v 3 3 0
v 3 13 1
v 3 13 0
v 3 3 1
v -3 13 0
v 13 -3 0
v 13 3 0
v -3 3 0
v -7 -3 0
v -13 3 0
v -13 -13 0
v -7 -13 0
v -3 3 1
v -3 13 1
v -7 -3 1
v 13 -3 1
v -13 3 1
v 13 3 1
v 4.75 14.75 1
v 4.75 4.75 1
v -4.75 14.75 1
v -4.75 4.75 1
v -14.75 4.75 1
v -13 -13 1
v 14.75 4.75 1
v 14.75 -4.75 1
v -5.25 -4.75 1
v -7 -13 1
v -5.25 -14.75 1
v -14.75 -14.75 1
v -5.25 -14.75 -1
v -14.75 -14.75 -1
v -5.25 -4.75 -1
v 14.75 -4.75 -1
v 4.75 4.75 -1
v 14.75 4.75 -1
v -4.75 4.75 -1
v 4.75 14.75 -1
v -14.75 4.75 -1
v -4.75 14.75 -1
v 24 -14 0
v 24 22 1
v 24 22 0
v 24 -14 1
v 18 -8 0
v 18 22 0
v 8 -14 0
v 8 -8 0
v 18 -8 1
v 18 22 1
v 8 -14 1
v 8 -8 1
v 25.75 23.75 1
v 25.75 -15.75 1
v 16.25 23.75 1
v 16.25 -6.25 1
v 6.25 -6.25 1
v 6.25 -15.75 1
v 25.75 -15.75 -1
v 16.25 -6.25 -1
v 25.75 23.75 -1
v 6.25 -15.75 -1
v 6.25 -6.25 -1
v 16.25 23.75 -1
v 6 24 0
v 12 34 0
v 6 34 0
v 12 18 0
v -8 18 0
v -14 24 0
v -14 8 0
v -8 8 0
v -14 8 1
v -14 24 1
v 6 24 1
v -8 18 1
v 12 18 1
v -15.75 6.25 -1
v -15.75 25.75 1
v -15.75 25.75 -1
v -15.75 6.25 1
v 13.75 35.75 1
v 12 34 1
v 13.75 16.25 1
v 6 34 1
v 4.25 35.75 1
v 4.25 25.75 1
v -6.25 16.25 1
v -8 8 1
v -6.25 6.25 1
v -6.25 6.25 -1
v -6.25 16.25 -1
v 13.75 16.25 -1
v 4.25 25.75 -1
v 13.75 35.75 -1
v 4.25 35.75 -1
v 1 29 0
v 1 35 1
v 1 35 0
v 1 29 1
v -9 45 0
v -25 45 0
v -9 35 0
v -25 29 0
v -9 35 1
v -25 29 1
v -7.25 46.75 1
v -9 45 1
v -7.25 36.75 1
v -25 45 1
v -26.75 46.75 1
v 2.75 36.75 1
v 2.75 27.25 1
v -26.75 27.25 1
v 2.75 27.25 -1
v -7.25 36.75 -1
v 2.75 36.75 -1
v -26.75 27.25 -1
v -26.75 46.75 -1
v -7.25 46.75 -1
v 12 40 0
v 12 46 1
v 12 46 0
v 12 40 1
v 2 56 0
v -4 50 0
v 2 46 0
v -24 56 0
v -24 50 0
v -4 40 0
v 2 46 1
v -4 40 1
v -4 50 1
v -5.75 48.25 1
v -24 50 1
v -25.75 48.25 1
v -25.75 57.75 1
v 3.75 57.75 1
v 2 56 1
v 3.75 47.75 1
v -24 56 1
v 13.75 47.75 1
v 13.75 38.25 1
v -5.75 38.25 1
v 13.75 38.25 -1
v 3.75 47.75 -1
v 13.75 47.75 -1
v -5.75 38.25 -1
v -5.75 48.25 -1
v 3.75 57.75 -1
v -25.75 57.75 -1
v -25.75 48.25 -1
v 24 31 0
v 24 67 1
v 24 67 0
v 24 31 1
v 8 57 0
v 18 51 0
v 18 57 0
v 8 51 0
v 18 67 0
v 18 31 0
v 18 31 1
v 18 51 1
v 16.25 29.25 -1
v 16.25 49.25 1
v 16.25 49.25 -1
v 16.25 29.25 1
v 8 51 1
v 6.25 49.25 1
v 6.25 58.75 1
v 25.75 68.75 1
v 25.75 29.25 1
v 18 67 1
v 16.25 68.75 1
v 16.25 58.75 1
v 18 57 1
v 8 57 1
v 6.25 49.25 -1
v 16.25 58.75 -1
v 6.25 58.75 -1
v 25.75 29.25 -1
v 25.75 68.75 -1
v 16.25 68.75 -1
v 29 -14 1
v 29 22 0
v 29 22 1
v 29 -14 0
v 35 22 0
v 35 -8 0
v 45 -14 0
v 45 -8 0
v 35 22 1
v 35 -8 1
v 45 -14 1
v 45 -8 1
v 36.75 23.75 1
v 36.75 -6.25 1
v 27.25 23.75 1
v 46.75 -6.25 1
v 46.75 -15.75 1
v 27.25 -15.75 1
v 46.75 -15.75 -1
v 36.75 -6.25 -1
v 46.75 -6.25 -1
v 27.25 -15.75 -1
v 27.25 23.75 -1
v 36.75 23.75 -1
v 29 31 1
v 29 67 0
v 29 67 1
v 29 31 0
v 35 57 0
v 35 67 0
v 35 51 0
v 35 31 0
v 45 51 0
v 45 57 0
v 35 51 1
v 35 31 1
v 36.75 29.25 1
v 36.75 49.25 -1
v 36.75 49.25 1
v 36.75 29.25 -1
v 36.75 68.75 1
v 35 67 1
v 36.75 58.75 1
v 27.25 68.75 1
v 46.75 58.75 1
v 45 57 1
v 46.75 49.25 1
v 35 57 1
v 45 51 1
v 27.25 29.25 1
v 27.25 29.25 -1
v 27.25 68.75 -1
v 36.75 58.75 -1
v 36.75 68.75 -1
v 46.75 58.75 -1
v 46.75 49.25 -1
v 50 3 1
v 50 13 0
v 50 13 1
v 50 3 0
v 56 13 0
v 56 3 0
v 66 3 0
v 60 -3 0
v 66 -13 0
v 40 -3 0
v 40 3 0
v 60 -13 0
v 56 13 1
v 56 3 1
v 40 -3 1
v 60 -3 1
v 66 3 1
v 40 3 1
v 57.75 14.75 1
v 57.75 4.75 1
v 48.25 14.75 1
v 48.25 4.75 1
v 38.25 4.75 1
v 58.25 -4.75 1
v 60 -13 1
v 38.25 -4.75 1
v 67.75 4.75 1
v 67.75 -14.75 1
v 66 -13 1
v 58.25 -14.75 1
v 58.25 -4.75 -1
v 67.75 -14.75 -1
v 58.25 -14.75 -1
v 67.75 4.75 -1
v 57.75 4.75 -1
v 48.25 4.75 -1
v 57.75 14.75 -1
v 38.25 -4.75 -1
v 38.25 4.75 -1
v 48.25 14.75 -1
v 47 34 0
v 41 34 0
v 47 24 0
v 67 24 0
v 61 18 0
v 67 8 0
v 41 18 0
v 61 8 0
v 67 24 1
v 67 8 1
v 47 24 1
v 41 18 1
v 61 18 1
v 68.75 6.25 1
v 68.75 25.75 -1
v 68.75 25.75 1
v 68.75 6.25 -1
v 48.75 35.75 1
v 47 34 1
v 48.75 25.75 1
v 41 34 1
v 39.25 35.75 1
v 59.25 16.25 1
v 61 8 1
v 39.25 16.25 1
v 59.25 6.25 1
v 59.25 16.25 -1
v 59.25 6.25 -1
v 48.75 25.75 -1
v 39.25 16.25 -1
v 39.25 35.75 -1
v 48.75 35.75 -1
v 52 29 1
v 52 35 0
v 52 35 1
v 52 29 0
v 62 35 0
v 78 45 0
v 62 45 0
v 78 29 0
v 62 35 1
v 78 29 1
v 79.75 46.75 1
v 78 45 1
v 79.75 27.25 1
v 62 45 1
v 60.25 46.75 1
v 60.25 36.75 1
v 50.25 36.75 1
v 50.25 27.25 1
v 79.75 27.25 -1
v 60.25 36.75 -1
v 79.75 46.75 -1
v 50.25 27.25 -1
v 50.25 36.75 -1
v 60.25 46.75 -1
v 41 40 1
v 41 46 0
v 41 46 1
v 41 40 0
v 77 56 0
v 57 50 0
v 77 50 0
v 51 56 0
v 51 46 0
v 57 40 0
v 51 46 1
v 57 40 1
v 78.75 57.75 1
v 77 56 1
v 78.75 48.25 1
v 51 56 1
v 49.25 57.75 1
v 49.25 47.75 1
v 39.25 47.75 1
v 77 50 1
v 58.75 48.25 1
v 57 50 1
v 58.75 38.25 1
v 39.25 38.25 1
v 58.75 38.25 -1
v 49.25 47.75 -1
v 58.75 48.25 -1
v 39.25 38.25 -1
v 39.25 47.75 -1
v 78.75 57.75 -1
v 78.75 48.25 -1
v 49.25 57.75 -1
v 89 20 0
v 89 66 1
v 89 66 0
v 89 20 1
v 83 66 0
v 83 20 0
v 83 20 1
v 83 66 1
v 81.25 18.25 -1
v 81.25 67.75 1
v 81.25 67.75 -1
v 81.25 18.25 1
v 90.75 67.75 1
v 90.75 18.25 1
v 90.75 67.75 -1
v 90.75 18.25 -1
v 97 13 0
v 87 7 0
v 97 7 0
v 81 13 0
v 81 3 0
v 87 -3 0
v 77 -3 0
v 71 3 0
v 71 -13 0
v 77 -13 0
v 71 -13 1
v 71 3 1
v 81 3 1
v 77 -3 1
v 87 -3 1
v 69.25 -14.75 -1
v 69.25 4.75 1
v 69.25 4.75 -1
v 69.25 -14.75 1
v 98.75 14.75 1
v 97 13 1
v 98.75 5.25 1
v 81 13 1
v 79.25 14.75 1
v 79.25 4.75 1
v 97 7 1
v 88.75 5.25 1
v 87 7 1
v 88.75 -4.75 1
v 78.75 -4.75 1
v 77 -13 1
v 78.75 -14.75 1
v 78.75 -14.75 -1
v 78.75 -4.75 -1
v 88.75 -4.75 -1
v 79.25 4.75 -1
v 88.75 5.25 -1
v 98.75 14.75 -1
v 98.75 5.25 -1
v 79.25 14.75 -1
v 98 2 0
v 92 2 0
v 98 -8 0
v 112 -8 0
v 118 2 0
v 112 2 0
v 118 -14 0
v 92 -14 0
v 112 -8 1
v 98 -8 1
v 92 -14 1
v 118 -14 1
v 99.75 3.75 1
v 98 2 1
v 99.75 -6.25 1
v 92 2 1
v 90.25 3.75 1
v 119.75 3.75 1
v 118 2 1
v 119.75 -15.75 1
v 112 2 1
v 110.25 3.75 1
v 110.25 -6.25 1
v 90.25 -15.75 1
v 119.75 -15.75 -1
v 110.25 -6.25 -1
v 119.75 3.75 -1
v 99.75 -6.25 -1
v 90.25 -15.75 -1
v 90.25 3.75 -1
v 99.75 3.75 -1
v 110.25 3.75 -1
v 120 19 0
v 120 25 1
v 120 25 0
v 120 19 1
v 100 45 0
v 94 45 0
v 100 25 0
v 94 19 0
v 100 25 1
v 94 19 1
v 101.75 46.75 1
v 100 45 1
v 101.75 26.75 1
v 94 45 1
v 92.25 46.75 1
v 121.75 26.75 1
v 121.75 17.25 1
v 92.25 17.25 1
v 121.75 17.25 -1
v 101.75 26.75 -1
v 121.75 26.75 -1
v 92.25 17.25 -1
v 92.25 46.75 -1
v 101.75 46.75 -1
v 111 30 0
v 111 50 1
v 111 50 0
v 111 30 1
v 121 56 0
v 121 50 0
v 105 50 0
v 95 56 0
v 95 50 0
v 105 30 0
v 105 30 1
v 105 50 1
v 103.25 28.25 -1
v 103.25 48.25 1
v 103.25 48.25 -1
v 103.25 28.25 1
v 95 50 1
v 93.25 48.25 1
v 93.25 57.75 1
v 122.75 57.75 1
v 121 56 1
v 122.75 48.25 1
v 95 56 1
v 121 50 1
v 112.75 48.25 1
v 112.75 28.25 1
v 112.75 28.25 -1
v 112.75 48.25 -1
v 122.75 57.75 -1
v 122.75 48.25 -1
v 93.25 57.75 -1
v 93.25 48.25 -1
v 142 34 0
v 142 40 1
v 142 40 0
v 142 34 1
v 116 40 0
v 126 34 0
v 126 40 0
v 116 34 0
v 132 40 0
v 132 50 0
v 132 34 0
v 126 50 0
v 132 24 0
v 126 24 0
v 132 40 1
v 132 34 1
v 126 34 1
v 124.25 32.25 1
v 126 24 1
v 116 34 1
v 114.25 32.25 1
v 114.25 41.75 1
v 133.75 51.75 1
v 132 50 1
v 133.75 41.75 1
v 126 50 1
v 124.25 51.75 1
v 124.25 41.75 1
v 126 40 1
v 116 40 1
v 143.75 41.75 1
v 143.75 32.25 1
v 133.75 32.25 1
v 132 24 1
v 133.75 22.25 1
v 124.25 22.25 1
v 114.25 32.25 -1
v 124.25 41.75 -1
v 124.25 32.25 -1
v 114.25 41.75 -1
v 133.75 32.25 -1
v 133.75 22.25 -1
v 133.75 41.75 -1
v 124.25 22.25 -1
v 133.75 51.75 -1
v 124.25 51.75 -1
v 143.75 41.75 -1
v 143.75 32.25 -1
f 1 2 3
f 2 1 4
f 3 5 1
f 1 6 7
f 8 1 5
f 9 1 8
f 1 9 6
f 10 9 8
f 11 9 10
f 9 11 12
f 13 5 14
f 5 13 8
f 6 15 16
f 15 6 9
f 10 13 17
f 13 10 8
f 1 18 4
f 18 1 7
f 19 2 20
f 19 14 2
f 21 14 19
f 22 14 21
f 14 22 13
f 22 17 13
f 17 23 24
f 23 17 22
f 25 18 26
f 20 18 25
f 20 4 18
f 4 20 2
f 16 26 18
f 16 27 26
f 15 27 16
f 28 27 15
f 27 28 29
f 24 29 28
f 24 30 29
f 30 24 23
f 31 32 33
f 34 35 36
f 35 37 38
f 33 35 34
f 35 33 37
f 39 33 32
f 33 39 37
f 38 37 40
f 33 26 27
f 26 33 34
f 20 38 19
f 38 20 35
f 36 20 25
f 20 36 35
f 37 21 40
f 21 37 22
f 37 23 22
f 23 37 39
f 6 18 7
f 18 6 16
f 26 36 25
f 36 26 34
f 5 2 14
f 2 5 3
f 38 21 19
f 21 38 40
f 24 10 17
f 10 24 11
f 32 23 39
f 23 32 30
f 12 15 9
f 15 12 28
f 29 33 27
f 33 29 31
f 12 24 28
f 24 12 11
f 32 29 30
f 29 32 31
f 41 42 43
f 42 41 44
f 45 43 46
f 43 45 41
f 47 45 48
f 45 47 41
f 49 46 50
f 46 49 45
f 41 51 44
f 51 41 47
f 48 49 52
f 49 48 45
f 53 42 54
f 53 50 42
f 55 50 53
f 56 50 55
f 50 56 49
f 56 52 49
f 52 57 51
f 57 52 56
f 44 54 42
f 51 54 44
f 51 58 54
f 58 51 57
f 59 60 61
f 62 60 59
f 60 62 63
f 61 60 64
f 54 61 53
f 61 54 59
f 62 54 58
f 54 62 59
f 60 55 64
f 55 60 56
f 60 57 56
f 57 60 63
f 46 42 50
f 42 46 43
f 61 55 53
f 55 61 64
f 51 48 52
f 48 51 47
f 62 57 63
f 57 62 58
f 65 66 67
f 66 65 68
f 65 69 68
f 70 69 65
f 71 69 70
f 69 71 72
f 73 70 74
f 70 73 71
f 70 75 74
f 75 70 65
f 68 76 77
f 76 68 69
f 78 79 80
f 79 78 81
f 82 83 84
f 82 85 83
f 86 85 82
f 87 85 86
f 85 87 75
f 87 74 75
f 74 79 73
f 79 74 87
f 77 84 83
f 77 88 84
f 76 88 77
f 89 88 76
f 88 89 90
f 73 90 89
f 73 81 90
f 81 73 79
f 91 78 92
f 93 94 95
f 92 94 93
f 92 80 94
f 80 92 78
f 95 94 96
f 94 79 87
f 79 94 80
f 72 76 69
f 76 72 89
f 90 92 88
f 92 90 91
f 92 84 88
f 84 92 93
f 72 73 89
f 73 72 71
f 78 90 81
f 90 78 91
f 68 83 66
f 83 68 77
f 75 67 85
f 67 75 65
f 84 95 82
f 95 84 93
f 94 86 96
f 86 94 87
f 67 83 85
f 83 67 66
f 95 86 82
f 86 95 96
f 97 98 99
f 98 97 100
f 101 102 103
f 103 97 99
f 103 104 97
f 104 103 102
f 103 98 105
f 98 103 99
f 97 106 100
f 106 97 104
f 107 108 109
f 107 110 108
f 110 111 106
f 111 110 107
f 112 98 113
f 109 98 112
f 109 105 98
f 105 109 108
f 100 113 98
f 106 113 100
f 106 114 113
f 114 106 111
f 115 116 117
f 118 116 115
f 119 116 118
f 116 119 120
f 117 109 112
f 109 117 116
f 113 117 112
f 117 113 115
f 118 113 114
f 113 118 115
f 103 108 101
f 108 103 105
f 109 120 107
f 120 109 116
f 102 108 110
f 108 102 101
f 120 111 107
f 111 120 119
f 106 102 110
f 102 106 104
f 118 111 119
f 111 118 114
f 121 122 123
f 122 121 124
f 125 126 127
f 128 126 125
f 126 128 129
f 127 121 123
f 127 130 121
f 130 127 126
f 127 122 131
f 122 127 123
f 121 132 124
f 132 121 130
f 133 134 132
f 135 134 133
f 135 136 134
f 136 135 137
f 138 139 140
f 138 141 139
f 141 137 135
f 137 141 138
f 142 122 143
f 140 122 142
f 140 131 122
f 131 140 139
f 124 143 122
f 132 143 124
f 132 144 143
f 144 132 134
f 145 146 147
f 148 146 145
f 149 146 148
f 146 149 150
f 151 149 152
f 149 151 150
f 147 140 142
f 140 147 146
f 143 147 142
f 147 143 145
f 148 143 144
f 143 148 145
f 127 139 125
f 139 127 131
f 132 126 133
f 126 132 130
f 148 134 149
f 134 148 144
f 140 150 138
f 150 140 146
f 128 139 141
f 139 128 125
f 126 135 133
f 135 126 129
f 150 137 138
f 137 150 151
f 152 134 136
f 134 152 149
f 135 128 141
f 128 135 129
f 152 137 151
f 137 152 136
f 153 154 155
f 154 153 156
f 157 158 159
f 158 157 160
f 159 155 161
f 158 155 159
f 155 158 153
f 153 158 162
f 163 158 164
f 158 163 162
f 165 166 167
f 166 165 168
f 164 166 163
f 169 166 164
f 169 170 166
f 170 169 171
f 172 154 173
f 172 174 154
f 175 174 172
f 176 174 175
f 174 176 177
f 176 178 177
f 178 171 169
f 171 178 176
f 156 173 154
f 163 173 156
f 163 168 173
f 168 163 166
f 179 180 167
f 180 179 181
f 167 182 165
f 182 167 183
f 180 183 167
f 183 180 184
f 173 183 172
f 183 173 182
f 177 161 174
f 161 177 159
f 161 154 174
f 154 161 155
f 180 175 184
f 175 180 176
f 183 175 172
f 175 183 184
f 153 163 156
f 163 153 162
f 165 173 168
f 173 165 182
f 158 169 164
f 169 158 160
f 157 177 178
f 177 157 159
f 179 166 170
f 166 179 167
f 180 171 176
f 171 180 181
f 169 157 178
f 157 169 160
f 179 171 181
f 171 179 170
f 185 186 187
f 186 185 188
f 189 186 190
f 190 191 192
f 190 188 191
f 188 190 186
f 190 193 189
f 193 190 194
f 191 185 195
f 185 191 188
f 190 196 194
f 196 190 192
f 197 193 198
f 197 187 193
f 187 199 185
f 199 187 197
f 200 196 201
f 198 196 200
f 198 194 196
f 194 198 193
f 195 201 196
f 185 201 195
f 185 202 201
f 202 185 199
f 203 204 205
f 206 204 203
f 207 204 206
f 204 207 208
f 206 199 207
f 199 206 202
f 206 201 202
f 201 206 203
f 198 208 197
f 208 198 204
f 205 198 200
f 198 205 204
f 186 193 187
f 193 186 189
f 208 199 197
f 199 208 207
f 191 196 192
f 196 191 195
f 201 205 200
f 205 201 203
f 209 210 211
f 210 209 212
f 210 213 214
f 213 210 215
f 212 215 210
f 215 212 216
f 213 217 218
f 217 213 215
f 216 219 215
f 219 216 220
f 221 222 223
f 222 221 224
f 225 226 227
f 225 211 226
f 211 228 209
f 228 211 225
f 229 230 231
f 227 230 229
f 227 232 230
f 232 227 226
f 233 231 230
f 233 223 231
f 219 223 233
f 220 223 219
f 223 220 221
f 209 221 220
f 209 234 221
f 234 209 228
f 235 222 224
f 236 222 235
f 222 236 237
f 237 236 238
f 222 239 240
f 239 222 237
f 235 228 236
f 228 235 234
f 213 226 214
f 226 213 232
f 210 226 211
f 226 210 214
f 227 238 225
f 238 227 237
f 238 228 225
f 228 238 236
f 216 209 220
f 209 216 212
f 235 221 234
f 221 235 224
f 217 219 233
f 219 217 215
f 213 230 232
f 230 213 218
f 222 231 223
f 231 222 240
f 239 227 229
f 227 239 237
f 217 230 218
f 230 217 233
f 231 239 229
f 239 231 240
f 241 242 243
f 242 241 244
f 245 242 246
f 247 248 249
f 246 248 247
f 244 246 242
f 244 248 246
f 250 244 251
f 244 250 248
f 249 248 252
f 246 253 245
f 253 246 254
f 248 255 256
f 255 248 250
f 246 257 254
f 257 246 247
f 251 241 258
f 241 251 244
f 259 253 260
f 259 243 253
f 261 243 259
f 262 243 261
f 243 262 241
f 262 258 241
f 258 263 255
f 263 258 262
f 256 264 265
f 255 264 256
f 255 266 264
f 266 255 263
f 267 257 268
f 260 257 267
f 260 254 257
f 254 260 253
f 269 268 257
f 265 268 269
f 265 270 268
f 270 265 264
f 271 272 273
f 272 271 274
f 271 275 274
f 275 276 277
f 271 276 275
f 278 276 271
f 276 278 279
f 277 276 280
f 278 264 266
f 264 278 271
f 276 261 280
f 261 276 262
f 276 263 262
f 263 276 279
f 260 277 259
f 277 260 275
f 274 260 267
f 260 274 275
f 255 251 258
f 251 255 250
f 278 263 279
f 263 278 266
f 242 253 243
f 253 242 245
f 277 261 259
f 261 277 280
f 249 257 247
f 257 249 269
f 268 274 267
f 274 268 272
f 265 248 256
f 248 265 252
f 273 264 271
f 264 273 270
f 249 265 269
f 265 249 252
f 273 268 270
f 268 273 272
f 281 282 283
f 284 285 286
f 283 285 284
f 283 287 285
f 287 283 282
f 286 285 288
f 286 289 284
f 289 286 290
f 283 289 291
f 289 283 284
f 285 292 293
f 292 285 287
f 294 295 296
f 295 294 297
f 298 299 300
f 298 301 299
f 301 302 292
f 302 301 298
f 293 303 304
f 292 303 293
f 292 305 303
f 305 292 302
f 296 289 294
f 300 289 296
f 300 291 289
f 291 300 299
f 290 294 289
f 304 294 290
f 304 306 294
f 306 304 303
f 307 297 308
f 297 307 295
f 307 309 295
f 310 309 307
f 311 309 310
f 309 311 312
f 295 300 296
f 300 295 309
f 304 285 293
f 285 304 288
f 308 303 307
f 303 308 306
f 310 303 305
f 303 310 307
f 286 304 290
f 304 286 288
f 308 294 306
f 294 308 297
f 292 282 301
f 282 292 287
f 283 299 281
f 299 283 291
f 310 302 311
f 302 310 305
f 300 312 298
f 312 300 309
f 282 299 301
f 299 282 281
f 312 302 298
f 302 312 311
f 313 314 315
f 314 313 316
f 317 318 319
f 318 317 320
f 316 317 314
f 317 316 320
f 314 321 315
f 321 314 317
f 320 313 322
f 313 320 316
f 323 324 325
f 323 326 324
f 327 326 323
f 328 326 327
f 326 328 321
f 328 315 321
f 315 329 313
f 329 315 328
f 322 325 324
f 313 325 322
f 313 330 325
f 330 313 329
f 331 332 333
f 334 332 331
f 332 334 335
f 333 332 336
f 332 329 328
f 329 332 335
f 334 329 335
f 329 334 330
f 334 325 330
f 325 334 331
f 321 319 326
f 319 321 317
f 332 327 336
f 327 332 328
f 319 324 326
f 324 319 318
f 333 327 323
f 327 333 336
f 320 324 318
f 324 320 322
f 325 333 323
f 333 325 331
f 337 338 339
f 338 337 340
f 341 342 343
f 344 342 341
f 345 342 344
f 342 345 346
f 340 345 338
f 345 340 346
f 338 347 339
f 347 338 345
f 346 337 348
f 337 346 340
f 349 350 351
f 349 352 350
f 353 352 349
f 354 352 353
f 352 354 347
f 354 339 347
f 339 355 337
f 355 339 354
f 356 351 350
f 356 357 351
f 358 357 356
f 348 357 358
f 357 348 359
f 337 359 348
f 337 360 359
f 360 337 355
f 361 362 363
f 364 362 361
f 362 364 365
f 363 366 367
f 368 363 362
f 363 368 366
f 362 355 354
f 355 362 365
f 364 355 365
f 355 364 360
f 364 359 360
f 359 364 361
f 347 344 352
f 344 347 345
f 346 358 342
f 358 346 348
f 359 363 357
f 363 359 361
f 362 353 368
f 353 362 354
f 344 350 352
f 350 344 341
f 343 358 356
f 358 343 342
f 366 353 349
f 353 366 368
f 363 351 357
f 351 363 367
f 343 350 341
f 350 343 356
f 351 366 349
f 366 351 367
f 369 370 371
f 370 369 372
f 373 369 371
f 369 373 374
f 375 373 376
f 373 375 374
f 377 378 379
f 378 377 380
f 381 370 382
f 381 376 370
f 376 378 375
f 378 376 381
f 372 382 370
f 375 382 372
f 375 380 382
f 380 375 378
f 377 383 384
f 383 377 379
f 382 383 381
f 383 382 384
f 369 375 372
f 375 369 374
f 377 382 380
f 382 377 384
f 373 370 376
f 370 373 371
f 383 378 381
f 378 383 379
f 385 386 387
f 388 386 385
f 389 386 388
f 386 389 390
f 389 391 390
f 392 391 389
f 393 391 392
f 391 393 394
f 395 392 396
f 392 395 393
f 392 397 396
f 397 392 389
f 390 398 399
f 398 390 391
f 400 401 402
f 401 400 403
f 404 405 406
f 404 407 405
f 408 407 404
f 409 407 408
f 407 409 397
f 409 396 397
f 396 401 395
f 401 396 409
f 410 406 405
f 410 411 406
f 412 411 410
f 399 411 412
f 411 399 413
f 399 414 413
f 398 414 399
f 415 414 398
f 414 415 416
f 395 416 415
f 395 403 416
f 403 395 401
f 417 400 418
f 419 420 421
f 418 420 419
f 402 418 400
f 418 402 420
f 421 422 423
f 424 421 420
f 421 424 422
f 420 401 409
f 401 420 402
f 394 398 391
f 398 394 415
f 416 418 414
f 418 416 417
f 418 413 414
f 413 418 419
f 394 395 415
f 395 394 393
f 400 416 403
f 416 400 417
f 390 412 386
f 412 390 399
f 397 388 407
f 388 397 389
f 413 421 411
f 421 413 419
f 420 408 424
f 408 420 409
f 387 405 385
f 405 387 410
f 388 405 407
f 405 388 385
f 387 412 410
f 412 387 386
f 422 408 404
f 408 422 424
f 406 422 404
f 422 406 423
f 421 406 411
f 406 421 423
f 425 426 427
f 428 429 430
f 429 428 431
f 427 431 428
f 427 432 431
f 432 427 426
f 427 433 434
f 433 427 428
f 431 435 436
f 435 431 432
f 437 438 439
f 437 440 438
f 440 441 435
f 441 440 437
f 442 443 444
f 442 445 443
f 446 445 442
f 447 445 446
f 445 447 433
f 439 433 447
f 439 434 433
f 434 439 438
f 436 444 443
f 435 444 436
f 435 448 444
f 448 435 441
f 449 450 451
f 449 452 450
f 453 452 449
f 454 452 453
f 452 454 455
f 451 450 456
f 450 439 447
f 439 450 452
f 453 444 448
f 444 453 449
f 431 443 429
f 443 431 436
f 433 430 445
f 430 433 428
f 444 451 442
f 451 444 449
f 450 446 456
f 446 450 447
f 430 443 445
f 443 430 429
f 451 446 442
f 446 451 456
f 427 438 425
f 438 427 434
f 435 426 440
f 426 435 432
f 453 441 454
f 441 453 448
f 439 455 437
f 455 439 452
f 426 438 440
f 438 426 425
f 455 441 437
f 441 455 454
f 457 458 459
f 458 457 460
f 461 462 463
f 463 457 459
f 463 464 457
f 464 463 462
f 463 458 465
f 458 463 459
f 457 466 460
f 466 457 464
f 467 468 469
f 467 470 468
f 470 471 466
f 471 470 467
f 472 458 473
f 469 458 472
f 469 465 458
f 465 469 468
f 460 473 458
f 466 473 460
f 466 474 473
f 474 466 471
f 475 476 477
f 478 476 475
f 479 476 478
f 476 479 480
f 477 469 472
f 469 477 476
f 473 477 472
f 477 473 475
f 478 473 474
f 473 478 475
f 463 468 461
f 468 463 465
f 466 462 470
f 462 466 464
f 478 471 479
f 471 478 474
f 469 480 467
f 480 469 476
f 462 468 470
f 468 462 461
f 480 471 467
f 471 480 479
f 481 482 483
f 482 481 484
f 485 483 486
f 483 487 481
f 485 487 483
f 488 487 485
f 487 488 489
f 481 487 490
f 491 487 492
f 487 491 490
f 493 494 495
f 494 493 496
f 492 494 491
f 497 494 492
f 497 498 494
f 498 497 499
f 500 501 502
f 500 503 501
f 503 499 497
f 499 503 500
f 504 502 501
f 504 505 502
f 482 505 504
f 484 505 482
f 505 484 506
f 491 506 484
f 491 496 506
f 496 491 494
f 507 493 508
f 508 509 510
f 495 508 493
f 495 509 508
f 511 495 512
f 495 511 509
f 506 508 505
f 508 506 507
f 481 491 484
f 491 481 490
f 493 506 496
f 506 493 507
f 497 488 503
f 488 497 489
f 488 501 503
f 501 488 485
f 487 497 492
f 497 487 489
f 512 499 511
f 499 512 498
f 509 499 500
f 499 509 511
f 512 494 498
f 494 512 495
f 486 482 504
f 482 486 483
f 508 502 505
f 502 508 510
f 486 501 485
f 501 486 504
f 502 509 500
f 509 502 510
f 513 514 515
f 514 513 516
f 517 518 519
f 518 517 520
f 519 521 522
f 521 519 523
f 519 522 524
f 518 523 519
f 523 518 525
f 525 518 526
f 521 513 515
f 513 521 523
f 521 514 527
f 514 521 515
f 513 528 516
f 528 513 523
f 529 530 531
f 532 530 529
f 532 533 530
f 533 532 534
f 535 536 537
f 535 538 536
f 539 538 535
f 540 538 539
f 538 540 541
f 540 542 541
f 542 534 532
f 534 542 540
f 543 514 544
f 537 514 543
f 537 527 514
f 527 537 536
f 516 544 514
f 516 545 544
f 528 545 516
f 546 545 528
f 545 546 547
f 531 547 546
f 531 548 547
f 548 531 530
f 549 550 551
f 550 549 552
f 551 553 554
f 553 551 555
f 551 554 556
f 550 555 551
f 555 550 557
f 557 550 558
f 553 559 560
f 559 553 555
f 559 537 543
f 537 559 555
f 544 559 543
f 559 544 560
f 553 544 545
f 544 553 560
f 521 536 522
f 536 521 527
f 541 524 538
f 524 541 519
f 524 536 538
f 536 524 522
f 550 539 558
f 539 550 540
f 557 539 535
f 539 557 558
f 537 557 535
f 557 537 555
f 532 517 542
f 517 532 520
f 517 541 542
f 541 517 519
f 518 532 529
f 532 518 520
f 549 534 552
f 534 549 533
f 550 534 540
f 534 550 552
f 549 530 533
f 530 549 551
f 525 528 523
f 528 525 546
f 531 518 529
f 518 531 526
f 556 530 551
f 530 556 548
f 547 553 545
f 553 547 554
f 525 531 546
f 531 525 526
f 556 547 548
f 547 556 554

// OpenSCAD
// Title: Pentoninoes
// Author: http://www.thingiverse.com/Jinja
// Date: 17-12-2016

/////////// START OF PARAMETERS /////////////////

// The width of the squares in mm
pixelSide = 10;

// The height of the pieces in mm
pixelHeight = 2; 

// The depth of the hole in each piece in mm
holeDepth = 1; 

// The width of the border in mm
pixelBorder = 2; 

// How many mm to shrink the border so there is space between the pieces
shrinkage = 0.25; 

piece1 = 1; // [0:Hide,1:Show]
piece2 = 1; // [0:Hide,1:Show]
piece3 = 1; // [0:Hide,1:Show]
piece4 = 1; // [0:Hide,1:Show]
piece5 = 1; // [0:Hide,1:Show]
piece6 = 1; // [0:Hide,1:Show]
piece7 = 1; // [0:Hide,1:Show]
piece8 = 1; // [0:Hide,1:Show]
piece9 = 1; // [0:Hide,1:Show]
piece10 = 1; // [0:Hide,1:Show]
piece11 = 1; // [0:Hide,1:Show]
piece12 = 1; // [0:Hide,1:Show]
piece13 = 1; // [0:Hide,1:Show]
piece14 = 1; // [0:Hide,1:Show]
piece15 = 1; // [0:Hide,1:Show]
piece16 = 1; // [0:Hide,1:Show]
piece17 = 1; // [0:Hide,1:Show]
piece18 = 1; // [0:Hide,1:Show]

/////////// END OF PARAMETERS /////////////////


$fs=0.3*1.0;
$fa=6.0*1.0; //smooth
//$fa=20; //rough

if(piece1)
{
    Piece1();
}
if(piece2)
{
    translate([pixelSide*2.1,-pixelSide*1.1,0])
    Piece2();
}
if(piece3)
{
    translate([-0.1*pixelSide,pixelSide*2.1,0])
    Piece3();
}
if(piece4)
{
    translate([-1.2*pixelSide,pixelSide*3.2,0])
    Piece4();
}
if(piece5)
{
    translate([-0.1*pixelSide,pixelSide*4.3,0])
    Piece5();
}
if(piece6)
{
    translate([2.1*pixelSide,pixelSide*3.4,0])
    Piece6();
}
if(piece7)
{
    translate([3.2*pixelSide,pixelSide*-1.1,0])
    Piece7();
}
if(piece8)
{
    translate([3.2*pixelSide,pixelSide*3.4,0])
    Piece8();
}
if(piece9)
{
    translate([5.3*pixelSide,pixelSide*0,0])
    Piece9();
}
if(piece10)
{
    translate([5.4*pixelSide,pixelSide*2.1,0])
    Piece10();
}
if(piece11)
{
    translate([6.5*pixelSide,pixelSide*3.2,0])
    Piece11();
}
if(piece12)
{
    translate([5.4*pixelSide,pixelSide*4.3,0])
    Piece12();
}
if(piece13)
{
    translate([8.6*pixelSide,pixelSide*2.3,0])
    Piece13();
}
if(piece14)
{
    translate([8.4*pixelSide,pixelSide*-0,0])
    Piece14();
}
if(piece15)
{
    translate([10.5*pixelSide,pixelSide*-1.1,0])
    Piece15();
}
if(piece16)
{
    translate([10.7*pixelSide,pixelSide*2.2,0])
    Piece16();
}
if(piece17)
{
    translate([10.8*pixelSide,pixelSide*3.3,0])
    Piece17();
}
if(piece18)
{
    translate([12.9*pixelSide,pixelSide*3.7,0])
    Piece18();
}



module Piece1()
{
    Pixel(0,0, 0,1,0,1,0,1,1,1);
    Pixel(1,0, 0,1,1,1,1,1,1,1);
    Pixel(0,1, 1,1,1,1,1,1,0,1);
    Pixel(-1,0, 1,1,1,1,0,1,0,1);
    Pixel(-1,-1, 1,1,0,1,1,1,1,1);
}

module Piece2()
{
    Pixel(0,0, 0,1,0,1,1,1,1,1);
    Pixel(0,1, 1,1,0,1,1,1,0,1);
    Pixel(0,2, 1,1,0,1,1,1,0,1);
    Pixel(0,3, 1,1,1,1,1,1,0,1);
    Pixel(-1,0, 1,1,1,1,0,1,1,1);
}

module Piece3()
{
    Pixel(0,0, 0,1,1,1,0,1,1,1);
    Pixel(1,0, 0,1,0,1,1,1,1,1);
    Pixel(1,1, 1,1,1,1,1,1,0,1);
    Pixel(-1,0, 1,1,1,1,0,1,0,1);
    Pixel(-1,-1, 1,1,0,1,1,1,1,1);
}

module Piece4()
{
    Pixel(0,0, 0,0,0,1,0,1,1,1);
    Pixel(1,0, 0,1,1,1,1,1,1,1);
    Pixel(0,1, 0,1,1,1,1,1,0,0);
    Pixel(-1,0, 1,1,0,0,0,1,1,1);
    Pixel(-1,1, 1,1,1,1,0,0,0,1);
}

module Piece5()
{
    Pixel(0,0, 1,1,0,1,0,1,1,1);
    Pixel(1,0, 0,1,1,1,1,1,1,1);
    Pixel(0,1, 0,1,1,1,1,1,0,1);
    Pixel(-2,1, 1,1,1,1,0,1,1,1);
    Pixel(-1,1, 0,1,1,1,0,1,1,1);
}

module Piece6()
{
    Pixel(0,0, 1,1,0,1,1,1,1,1);
    Pixel(0,1, 1,1,0,1,1,1,0,1);
    Pixel(0,2, 0,1,0,1,1,1,0,1);
    Pixel(0,3, 1,1,1,1,1,1,0,1);
    Pixel(-1,2, 1,1,1,1,0,1,1,1);
}

module Piece7()
{
    scale([-1,1,1])
    Piece2();
}

module Piece8()
{
    scale([-1,1,1])
    Piece6();
}

module Piece9()
{
    scale([-1,1,1])
    Piece1();
}

module Piece10()
{
    scale([-1,1,1])
    Piece3();
}

module Piece11()
{
    scale([-1,1,1])
    Piece4();
}

module Piece12()
{
    scale([-1,1,1])
    Piece5();
}

module Piece13()
{
    Pixel(0,0, 1,1,0,1,1,1,1,1);
    Pixel(0,1, 1,1,0,1,1,1,0,1);
    Pixel(0,2, 1,1,0,1,1,1,0,1);
    Pixel(0,3, 1,1,0,1,1,1,0,1);
    Pixel(0,4, 1,1,1,1,1,1,0,1);
}

module Piece14()
{
    Pixel(0,0, 0,1,0,1,1,1,1,1);
    Pixel(1,1, 0,1,1,1,1,1,1,1);
    Pixel(0,1, 1,1,1,1,0,1,0,1);
    Pixel(-1,0, 1,1,1,1,0,1,0,1);
    Pixel(-1,-1, 1,1,0,1,1,1,1,1);
}

module Piece15()
{
    Pixel(0,0, 0,1,1,1,0,1,1,1);
    Pixel(1,0, 0,1,0,1,1,1,1,1);
    Pixel(1,1, 1,1,1,1,1,1,0,1);
    Pixel(-1,0, 1,1,0,1,0,1,1,1);
    Pixel(-1,1, 1,1,1,1,1,1,0,1);
}

module Piece16()
{
    Pixel(0,0, 0,1,1,1,0,1,1,1);
    Pixel(1,0, 0,1,1,1,1,1,1,1);
    Pixel(-1,2, 1,1,1,1,1,1,0,1);
    Pixel(-1,0, 1,1,0,1,0,1,1,1);
    Pixel(-1,1, 1,1,0,1,1,1,0,1);
}

module Piece17()
{
    Pixel(0,0, 1,1,0,1,1,1,1,1);
    Pixel(0,1, 1,1,0,1,1,1,0,1);
    Pixel(0,2, 0,1,1,1,0,1,0,1);
    Pixel(1,2, 0,1,1,1,1,1,1,1);
    Pixel(-1,2, 1,1,1,1,0,1,1,1);
}

module Piece18()
{
    Pixel(0,0, 0,1,0,1,0,1,0,1);
    Pixel(1,0, 0,1,1,1,1,1,1,1);
    Pixel(0,1, 1,1,1,1,1,1,0,1);
    Pixel(-1,0, 1,1,1,1,0,1,1,1);
    Pixel(0,-1, 1,1,0,1,1,1,1,1);
}


module Pixel( x, y, s1, s2, s3, s4, s5, s6, s7, s8 )
{
    translate([x*pixelSide, y*pixelSide,0])
    difference()
    {
        cube([pixelSide,pixelSide,pixelHeight],true);
        //translate([0,0,0.5*pixelHeight])
        union()
        {
            translate([0,0,pixelHeight-holeDepth])
            cube([pixelSide-2*pixelBorder,pixelSide-2*pixelBorder,pixelHeight],true);
            if(!s1)
            {
                translate([-pixelBorder,0,pixelHeight-holeDepth])
                cube([pixelSide-2*pixelBorder,pixelSide-2*pixelBorder,pixelHeight],true);
            }
            else
            {
                translate([-(pixelSide-shrinkage),0,0])
                cube([pixelSide,pixelSide,pixelHeight],true);
            }

            if(!s2)
            {
                translate([-(pixelSide-pixelBorder),(pixelSide-pixelBorder),pixelHeight-holeDepth])
                cube([pixelSide,pixelSide,pixelHeight],true);
            }

            if(!s3)
            {
                translate([0,pixelBorder,pixelHeight-holeDepth])
                cube([pixelSide-2*pixelBorder,pixelSide-2*pixelBorder,pixelHeight],true);
            }
            else
            {
                translate([0,(pixelSide-shrinkage),0])
                cube([pixelSide,pixelSide,pixelHeight],true);
            }


            if(!s4)
            {
                translate([(pixelSide-pixelBorder),(pixelSide-pixelBorder),pixelHeight-holeDepth])
                cube([pixelSide,pixelSide,pixelHeight],true);
            }

            if(!s5)
            {
                translate([pixelBorder,0,pixelHeight-holeDepth])
                cube([pixelSide-2*pixelBorder,pixelSide-2*pixelBorder,pixelHeight],true);
            }
            else
            {
                translate([(pixelSide-shrinkage),0,0])
                cube([pixelSide,pixelSide,pixelHeight],true);
            }


            if(!s6)
            {
                translate([(pixelSide-pixelBorder),-(pixelSide-pixelBorder),pixelHeight-holeDepth])
                cube([pixelSide,pixelSide,pixelHeight],true);
            }

            if(!s7)
            {
                translate([0,-pixelBorder,pixelHeight-holeDepth])
                cube([pixelSide-2*pixelBorder,pixelSide-2*pixelBorder,pixelHeight],true);
            }
            else
            {
                translate([0,-(pixelSide-shrinkage),0])
                cube([pixelSide,pixelSide,pixelHeight],true);
            }


            if(!s8)
            {
                translate([-(pixelSide-pixelBorder),-(pixelSide-pixelBorder),pixelHeight-holeDepth])
                cube([pixelSide,pixelSide,pixelHeight],true);
            }
            
            if(s8!=0)
            {
                translate([-(pixelSide-shrinkage)*0.5,-(pixelSide-shrinkage)*0.5,0])
                cube([shrinkage,shrinkage,pixelHeight],true);
            }

            if(s6!=0)
            {
                translate([(pixelSide-shrinkage)*0.5,-(pixelSide-shrinkage)*0.5,0])
                cube([shrinkage,shrinkage,pixelHeight],true);
            }

            if(s4!=0)
            {
                translate([(pixelSide-shrinkage)*0.5,(pixelSide-shrinkage)*0.5,0])
                cube([shrinkage,shrinkage,pixelHeight],true);
            }

            if(s2!=0)
            {
                translate([-(pixelSide-shrinkage)*0.5,(pixelSide-shrinkage)*0.5,0])
                cube([shrinkage,shrinkage,pixelHeight],true);
            }

        }
    }
}
